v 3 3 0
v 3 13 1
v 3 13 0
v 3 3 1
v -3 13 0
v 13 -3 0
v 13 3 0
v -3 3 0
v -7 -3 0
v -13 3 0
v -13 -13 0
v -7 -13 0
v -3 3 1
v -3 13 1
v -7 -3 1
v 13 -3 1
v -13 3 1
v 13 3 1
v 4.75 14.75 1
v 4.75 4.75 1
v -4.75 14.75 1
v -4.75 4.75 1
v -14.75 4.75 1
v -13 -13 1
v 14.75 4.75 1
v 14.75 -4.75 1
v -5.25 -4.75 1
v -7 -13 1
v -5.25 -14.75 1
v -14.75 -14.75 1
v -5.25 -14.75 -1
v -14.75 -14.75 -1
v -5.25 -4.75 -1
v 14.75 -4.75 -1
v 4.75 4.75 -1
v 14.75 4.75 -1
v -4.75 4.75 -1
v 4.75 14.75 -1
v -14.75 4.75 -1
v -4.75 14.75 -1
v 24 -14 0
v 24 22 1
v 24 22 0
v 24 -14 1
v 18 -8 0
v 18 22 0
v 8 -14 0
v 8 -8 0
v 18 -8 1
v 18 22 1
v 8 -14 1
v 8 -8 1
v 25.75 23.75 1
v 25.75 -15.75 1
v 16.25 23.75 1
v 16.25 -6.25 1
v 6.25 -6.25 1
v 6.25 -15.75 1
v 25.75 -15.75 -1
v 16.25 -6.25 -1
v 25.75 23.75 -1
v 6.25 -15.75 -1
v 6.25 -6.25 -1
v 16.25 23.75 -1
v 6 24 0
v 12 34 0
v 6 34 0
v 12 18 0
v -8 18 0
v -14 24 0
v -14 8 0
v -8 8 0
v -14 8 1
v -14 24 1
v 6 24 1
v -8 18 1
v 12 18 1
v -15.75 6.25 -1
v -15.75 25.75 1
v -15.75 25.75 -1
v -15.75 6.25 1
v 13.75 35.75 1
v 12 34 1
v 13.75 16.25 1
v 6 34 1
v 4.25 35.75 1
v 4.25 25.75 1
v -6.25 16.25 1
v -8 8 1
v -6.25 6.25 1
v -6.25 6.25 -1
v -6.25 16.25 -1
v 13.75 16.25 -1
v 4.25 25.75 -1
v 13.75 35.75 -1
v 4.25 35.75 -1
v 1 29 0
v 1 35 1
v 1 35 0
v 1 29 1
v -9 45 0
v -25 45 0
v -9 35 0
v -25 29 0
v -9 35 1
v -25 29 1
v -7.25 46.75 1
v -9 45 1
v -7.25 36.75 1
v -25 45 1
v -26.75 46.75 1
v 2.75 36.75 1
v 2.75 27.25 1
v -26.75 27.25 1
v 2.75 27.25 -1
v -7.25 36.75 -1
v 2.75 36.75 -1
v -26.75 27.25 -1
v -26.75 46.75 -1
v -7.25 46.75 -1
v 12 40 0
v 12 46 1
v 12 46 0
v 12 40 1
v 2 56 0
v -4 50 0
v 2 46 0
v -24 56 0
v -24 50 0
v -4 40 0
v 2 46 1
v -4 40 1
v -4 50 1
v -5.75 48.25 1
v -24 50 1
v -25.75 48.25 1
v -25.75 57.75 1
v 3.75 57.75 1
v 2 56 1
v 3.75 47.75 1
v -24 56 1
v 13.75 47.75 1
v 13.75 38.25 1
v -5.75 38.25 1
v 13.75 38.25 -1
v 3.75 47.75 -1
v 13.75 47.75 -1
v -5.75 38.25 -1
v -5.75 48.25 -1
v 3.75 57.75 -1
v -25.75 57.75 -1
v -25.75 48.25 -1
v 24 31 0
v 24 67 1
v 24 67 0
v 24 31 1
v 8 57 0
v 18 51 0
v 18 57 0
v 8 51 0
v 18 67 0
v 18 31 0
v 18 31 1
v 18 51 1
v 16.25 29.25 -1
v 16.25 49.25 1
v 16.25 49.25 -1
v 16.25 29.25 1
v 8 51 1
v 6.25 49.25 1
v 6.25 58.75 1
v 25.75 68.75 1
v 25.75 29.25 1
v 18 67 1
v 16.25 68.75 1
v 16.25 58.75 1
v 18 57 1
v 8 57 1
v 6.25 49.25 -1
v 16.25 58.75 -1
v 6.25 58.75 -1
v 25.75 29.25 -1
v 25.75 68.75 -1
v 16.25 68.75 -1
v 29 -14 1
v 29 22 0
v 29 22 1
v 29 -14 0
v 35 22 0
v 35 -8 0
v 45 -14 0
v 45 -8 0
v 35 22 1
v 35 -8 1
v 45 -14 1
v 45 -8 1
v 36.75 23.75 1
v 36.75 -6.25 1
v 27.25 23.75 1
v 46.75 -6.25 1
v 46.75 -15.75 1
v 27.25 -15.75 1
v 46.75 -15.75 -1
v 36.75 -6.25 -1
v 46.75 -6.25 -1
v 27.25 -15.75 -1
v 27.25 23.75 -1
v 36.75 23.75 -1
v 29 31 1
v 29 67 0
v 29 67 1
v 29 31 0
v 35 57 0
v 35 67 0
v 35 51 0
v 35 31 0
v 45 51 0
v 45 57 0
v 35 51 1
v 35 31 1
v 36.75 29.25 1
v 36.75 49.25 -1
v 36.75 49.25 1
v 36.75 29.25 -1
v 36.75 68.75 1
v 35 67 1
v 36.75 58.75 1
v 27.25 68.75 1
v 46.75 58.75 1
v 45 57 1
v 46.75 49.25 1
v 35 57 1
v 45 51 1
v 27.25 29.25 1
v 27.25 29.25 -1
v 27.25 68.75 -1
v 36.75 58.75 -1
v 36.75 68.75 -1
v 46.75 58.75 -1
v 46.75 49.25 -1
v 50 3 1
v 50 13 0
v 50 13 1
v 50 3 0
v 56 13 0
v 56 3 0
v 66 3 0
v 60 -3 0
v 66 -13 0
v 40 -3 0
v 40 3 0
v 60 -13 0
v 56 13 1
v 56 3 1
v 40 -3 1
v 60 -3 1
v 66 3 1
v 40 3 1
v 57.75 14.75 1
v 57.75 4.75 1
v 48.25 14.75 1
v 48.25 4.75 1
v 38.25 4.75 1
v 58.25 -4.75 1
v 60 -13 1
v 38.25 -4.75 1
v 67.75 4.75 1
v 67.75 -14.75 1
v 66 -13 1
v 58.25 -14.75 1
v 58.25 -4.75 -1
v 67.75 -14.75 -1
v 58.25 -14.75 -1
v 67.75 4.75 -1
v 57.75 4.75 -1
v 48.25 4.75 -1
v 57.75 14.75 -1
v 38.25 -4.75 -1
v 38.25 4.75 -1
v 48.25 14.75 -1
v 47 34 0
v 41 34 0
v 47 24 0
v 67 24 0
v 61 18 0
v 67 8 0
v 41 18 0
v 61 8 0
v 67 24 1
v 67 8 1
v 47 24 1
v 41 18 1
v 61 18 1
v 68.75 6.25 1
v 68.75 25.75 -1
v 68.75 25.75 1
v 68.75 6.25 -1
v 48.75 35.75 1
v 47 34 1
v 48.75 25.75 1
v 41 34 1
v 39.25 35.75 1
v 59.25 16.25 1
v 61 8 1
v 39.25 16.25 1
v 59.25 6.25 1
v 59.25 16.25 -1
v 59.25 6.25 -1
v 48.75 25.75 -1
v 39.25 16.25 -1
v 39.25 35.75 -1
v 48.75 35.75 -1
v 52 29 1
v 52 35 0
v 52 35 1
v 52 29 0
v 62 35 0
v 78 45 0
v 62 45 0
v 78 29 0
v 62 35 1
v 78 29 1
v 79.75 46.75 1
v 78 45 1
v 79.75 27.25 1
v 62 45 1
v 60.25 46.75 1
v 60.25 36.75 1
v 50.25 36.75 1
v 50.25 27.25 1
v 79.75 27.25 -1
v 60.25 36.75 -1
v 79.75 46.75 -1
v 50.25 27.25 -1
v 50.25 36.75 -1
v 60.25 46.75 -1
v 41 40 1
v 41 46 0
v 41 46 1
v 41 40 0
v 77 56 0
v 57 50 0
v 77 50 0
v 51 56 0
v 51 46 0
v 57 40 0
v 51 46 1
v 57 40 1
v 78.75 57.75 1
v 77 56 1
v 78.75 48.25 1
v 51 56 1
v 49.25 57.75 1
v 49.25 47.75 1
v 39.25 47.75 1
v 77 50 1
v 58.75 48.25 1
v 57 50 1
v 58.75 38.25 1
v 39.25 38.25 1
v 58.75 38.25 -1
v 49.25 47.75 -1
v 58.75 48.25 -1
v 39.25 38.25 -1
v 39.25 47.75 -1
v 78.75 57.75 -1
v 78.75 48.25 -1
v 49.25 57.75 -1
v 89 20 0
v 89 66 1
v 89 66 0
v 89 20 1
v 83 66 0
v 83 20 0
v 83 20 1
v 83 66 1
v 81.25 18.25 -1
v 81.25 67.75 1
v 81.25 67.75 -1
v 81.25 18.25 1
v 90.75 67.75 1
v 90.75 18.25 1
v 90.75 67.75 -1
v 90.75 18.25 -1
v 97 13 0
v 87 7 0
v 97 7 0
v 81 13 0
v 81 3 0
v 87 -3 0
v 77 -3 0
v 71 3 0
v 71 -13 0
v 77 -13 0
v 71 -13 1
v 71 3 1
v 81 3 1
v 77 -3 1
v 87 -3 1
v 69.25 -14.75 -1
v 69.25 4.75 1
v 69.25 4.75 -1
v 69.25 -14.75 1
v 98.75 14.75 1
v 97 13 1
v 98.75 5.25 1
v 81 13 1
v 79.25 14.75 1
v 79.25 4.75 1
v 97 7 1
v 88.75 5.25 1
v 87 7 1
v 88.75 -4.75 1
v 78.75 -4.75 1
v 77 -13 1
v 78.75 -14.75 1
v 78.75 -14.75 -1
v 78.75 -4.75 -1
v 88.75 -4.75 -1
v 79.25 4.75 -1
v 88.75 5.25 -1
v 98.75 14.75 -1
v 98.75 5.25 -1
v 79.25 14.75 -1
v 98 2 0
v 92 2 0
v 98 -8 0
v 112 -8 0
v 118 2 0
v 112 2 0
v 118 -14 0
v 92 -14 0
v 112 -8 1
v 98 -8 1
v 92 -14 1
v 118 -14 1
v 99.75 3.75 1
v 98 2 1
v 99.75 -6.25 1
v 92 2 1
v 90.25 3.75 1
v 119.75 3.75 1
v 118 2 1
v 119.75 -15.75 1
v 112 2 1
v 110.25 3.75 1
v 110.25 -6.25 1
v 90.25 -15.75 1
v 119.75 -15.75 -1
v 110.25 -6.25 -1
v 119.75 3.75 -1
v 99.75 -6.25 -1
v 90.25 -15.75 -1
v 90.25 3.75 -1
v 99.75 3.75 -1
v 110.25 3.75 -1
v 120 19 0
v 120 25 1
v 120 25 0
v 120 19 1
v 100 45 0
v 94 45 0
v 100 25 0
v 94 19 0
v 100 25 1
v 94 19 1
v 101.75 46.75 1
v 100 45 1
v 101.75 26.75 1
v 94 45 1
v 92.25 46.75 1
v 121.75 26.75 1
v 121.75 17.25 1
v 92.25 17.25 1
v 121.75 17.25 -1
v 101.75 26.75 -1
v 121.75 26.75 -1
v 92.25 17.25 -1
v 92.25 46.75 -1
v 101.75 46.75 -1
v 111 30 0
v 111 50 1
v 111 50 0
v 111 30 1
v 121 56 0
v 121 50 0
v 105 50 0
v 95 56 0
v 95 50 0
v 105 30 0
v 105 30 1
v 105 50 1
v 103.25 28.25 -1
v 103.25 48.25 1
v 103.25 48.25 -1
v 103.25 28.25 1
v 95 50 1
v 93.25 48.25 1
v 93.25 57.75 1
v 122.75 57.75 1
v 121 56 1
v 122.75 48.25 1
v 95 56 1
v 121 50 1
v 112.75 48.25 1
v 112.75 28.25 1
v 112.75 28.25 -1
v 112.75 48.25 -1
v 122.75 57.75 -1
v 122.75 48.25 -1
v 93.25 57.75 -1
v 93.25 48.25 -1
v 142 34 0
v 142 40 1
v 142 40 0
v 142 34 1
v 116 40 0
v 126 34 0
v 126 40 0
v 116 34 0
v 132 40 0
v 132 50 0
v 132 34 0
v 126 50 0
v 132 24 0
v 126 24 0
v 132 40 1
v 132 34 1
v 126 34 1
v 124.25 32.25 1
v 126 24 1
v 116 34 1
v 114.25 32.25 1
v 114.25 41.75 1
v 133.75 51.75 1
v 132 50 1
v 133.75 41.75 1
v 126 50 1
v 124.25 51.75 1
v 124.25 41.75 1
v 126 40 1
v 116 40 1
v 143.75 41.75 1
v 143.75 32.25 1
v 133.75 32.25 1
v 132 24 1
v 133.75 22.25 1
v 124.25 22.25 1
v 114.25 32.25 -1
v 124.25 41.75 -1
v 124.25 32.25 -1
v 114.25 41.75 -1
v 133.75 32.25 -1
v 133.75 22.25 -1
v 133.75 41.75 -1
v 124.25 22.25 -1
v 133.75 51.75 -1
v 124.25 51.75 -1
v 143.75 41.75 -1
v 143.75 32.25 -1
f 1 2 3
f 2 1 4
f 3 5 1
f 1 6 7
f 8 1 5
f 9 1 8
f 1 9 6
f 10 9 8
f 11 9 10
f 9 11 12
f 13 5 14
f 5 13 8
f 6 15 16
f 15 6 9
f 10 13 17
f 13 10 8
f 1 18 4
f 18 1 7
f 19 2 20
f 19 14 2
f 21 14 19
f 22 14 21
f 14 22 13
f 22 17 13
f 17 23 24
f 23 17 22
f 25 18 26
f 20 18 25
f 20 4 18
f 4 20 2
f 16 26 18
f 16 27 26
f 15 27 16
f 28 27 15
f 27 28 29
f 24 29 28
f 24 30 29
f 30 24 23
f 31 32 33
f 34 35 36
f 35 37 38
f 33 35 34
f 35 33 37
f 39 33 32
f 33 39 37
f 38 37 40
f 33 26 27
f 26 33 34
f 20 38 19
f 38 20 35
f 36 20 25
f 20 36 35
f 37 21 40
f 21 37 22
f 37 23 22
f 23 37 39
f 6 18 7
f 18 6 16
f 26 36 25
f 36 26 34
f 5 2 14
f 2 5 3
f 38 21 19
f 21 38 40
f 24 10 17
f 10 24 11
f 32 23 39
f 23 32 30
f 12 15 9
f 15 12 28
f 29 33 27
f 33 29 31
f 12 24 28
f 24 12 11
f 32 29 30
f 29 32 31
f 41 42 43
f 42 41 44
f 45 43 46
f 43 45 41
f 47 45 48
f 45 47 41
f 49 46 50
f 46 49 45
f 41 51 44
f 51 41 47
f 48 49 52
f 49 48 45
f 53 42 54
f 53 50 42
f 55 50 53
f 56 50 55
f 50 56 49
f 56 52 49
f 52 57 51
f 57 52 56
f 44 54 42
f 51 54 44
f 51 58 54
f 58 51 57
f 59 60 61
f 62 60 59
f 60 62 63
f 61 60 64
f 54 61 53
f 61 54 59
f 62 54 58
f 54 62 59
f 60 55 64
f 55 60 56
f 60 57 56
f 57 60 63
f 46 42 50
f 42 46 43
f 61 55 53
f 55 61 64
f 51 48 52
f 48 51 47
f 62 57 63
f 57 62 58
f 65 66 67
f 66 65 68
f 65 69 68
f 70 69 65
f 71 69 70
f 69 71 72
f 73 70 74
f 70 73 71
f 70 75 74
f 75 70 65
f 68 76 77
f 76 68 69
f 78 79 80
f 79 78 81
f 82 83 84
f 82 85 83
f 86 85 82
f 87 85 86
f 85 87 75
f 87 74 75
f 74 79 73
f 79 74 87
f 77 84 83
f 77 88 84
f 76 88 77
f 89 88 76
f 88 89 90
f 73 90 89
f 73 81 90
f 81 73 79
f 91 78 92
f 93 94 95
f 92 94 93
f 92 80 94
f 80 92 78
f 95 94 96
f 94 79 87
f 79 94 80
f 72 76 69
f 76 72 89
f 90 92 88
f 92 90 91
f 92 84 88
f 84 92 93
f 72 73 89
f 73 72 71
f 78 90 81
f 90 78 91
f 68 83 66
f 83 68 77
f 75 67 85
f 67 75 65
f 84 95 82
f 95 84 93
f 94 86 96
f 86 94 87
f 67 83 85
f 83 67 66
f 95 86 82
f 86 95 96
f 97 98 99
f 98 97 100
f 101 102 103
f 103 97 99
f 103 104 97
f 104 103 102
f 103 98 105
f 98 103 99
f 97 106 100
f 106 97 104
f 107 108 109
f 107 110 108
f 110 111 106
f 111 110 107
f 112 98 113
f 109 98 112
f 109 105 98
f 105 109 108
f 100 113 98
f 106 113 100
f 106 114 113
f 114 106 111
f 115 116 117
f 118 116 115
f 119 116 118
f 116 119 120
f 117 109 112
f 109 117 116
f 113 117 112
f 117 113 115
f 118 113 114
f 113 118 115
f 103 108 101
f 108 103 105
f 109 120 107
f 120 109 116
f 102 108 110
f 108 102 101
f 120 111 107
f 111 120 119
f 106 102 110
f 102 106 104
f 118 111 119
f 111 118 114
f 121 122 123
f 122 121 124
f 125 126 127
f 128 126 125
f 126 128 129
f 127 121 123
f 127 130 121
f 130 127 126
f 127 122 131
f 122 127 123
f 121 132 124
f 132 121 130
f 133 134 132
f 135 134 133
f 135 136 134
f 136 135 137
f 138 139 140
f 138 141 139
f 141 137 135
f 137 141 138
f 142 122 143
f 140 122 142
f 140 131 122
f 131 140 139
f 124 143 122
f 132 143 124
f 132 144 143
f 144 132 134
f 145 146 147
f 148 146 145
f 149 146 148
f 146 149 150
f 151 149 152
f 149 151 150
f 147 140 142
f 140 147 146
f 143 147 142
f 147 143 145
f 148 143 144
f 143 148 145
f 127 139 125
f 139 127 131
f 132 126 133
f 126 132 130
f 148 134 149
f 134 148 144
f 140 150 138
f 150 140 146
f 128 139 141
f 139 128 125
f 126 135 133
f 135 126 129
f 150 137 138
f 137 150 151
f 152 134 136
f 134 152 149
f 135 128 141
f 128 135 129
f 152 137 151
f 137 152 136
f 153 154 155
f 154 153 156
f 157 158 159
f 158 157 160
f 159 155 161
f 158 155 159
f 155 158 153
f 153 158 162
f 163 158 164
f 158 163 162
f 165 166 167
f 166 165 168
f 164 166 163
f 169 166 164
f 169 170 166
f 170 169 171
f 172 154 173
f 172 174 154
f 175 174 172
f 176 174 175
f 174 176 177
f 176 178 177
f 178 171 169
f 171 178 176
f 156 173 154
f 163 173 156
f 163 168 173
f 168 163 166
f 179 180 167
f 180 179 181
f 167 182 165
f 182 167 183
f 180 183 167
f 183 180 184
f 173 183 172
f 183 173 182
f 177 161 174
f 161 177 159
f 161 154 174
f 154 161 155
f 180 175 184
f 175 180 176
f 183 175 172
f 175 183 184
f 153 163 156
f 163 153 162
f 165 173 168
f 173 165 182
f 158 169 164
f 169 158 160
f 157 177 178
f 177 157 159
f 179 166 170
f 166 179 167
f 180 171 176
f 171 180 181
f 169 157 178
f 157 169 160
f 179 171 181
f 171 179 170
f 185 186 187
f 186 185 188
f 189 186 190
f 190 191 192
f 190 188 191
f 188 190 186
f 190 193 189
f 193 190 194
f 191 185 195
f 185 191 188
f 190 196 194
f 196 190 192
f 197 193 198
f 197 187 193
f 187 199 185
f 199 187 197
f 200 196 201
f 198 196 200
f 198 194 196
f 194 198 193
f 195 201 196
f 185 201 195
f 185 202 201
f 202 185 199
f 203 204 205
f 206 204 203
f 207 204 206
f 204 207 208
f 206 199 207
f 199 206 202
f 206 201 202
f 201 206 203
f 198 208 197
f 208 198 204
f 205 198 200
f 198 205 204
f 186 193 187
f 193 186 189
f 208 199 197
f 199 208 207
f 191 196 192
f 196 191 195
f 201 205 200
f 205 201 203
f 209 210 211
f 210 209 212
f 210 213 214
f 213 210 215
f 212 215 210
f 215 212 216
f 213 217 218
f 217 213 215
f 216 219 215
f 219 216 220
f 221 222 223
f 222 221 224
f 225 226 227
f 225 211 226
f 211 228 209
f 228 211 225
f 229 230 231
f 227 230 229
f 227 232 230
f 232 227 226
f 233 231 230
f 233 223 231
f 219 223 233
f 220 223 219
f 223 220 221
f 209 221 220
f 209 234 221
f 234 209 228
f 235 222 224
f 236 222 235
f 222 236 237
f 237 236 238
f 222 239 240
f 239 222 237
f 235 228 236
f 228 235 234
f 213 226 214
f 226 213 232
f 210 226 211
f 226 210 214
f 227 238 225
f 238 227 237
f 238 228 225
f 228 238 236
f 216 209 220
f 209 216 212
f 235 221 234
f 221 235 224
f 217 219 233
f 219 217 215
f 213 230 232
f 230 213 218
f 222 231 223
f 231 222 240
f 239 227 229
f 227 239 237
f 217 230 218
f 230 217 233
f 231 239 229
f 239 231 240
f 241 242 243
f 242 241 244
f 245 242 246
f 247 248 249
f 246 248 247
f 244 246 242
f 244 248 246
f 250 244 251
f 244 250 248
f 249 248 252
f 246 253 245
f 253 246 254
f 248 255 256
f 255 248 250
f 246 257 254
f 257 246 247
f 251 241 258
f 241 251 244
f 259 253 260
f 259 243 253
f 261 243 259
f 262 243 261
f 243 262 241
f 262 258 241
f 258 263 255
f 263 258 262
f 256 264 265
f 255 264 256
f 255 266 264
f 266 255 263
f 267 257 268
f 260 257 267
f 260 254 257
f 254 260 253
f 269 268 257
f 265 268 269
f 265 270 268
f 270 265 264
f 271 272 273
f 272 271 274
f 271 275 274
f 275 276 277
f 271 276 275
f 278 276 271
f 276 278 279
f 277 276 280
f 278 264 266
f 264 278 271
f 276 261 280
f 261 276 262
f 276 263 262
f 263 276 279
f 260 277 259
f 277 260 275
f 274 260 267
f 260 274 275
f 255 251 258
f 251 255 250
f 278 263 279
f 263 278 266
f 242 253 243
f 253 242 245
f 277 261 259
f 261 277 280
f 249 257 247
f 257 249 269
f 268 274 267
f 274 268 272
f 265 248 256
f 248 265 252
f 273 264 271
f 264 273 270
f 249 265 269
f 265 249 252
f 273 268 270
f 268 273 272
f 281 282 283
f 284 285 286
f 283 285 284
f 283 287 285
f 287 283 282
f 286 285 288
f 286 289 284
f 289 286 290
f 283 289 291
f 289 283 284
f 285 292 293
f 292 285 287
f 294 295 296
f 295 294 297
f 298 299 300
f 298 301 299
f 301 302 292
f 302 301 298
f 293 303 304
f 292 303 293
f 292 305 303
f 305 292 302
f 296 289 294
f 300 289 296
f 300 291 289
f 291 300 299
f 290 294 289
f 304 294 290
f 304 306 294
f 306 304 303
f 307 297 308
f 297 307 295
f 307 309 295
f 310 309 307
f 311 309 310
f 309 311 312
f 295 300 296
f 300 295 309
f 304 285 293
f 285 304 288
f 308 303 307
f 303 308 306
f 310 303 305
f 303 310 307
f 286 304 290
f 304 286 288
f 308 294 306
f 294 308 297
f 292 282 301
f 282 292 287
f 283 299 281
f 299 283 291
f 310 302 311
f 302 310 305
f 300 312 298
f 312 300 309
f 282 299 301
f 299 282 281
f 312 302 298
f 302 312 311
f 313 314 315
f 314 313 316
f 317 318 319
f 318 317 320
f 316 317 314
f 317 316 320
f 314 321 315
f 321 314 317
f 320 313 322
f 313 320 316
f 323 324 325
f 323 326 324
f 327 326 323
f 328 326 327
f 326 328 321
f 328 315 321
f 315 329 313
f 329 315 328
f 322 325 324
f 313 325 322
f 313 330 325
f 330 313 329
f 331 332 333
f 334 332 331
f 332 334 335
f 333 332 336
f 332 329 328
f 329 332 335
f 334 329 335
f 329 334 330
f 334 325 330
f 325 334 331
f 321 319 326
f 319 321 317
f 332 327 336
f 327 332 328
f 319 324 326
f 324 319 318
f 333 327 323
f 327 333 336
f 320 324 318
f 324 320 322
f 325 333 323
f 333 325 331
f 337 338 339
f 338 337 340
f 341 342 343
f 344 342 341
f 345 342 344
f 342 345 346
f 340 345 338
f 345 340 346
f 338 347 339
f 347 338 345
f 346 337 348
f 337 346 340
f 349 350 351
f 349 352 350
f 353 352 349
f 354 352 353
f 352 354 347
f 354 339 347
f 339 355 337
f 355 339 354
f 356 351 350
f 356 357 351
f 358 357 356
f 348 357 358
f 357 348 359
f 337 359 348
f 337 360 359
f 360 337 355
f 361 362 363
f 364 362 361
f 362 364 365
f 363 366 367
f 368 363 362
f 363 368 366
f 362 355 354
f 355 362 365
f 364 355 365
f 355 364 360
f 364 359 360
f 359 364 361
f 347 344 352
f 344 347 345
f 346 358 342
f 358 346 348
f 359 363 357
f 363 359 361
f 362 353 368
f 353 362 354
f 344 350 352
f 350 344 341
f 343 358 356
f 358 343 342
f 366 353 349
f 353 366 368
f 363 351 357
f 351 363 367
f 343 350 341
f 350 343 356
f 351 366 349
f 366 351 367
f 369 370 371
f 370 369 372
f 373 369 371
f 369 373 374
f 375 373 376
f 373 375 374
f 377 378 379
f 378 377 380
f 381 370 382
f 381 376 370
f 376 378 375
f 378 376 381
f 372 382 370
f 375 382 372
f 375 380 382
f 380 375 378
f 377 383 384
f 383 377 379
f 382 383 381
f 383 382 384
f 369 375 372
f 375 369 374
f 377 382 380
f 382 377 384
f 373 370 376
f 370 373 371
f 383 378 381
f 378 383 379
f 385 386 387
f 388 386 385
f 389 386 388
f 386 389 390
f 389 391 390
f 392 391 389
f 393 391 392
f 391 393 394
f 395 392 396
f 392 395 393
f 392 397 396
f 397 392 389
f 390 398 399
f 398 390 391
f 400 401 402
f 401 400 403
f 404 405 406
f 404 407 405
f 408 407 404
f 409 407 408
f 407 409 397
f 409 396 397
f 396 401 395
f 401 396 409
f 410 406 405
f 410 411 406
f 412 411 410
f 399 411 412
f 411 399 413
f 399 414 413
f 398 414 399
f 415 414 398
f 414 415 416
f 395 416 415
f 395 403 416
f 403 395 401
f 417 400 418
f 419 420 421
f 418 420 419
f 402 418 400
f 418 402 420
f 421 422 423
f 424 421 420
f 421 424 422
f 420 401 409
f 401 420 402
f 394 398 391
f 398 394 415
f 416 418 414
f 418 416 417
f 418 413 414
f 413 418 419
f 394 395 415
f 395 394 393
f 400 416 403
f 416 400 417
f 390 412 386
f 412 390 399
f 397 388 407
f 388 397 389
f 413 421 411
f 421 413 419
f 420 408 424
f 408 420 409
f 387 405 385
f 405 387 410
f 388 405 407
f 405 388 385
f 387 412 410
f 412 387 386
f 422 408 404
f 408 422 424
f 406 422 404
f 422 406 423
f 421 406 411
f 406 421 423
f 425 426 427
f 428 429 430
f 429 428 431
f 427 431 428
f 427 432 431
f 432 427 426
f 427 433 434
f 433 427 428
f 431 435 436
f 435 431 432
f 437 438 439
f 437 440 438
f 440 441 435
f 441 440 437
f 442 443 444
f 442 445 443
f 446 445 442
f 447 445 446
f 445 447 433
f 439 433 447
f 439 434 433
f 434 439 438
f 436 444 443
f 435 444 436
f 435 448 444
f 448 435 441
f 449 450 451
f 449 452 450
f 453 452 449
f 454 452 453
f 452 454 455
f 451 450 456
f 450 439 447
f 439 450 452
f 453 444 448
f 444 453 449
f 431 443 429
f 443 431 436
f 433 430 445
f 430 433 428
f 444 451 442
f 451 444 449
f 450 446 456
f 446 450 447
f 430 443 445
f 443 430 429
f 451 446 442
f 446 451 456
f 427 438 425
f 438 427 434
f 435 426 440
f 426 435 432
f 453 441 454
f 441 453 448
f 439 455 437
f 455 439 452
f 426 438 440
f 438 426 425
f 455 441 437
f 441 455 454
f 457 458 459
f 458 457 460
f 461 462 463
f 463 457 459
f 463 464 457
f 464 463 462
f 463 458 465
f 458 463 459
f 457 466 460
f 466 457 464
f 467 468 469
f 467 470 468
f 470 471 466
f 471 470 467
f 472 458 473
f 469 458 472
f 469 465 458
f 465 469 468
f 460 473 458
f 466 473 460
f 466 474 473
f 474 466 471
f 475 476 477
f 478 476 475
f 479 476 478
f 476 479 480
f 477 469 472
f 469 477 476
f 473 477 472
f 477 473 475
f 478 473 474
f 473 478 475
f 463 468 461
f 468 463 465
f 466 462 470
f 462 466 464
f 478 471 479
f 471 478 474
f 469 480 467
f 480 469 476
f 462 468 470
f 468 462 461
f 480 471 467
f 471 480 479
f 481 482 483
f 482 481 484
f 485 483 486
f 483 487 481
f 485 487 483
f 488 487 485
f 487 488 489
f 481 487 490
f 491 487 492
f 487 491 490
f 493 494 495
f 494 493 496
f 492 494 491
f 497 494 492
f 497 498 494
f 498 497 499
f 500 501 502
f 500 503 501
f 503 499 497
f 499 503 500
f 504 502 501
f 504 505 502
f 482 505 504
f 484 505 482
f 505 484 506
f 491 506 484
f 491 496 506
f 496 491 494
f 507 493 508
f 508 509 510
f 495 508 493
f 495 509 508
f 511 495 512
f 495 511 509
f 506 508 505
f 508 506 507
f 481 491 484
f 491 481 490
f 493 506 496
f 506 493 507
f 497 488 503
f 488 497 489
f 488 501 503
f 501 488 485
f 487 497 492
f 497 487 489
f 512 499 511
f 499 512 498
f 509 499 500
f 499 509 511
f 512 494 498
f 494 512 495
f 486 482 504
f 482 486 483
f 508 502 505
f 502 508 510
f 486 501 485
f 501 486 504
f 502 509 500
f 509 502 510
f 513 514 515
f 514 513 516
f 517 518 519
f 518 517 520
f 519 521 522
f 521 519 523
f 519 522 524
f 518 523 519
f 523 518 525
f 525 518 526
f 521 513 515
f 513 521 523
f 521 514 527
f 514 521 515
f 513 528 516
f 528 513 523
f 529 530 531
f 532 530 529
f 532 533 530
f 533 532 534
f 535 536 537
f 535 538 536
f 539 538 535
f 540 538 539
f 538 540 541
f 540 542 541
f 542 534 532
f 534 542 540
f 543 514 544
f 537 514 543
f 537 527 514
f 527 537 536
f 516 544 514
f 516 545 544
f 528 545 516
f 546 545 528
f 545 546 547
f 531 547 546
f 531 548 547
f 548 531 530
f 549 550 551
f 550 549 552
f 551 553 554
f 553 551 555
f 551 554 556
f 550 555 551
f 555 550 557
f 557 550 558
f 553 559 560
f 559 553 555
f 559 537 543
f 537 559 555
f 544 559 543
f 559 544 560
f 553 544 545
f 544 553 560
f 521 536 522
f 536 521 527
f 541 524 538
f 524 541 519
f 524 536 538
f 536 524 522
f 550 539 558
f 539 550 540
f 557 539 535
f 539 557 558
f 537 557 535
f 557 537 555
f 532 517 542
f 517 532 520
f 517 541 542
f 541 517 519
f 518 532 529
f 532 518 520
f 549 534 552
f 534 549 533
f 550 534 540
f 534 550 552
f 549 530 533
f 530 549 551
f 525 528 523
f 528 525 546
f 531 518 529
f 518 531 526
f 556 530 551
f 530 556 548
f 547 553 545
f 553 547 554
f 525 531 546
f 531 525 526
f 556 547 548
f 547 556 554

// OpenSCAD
// Title: Pentoninoes
// Author: http://www.thingiverse.com/Jinja
// Date: 17-12-2016

/////////// START OF PARAMETERS /////////////////

// The width of the squares in mm
pixelSide = 10;

// The height of the pieces in mm
pixelHeight = 2; 

// The depth of the hole in each piece in mm
holeDepth = 1; 

// The width of the border in mm
pixelBorder = 2; 

// How many mm to shrink the border so there is space between the pieces
shrinkage = 0.25; 

piece1 = 1; // [0:Hide,1:Show]
piece2 = 1; // [0:Hide,1:Show]
piece3 = 1; // [0:Hide,1:Show]
piece4 = 1; // [0:Hide,1:Show]
piece5 = 1; // [0:Hide,1:Show]
piece6 = 1; // [0:Hide,1:Show]
piece7 = 1; // [0:Hide,1:Show]
piece8 = 1; // [0:Hide,1:Show]
piece9 = 1; // [0:Hide,1:Show]
piece10 = 1; // [0:Hide,1:Show]
piece11 = 1; // [0:Hide,1:Show]
piece12 = 1; // [0:Hide,1:Show]
piece13 = 1; // [0:Hide,1:Show]
piece14 = 1; // [0:Hide,1:Show]
piece15 = 1; // [0:Hide,1:Show]
piece16 = 1; // [0:Hide,1:Show]
piece17 = 1; // [0:Hide,1:Show]
piece18 = 1; // [0:Hide,1:Show]

/////////// END OF PARAMETERS /////////////////


$fs=0.3*1.0;
$fa=6.0*1.0; //smooth
//$fa=20; //rough

if(piece1)
{
    Piece1();
}
if(piece2)
{
    translate([pixelSide*2.1,-pixelSide*1.1,0])
    Piece2();
}
if(piece3)
{
    translate([-0.1*pixelSide,pixelSide*2.1,0])
    Piece3();
}
if(piece4)
{
    translate([-1.2*pixelSide,pixelSide*3.2,0])
    Piece4();
}
if(piece5)
{
    translate([-0.1*pixelSide,pixelSide*4.3,0])
    Piece5();
}
if(piece6)
{
    translate([2.1*pixelSide,pixelSide*3.4,0])
    Piece6();
}
if(piece7)
{
    translate([3.2*pixelSide,pixelSide*-1.1,0])
    Piece7();
}
if(piece8)
{
    translate([3.2*pixelSide,pixelSide*3.4,0])
    Piece8();
}
if(piece9)
{
    translate([5.3*pixelSide,pixelSide*0,0])
    Piece9();
}
if(piece10)
{
    translate([5.4*pixelSide,pixelSide*2.1,0])
    Piece10();
}
if(piece11)
{
    translate([6.5*pixelSide,pixelSide*3.2,0])
    Piece11();
}
if(piece12)
{
    translate([5.4*pixelSide,pixelSide*4.3,0])
    Piece12();
}
if(piece13)
{
    translate([8.6*pixelSide,pixelSide*2.3,0])
    Piece13();
}
if(piece14)
{
    translate([8.4*pixelSide,pixelSide*-0,0])
    Piece14();
}
if(piece15)
{
    translate([10.5*pixelSide,pixelSide*-1.1,0])
    Piece15();
}
if(piece16)
{
    translate([10.7*pixelSide,pixelSide*2.2,0])
    Piece16();
}
if(piece17)
{
    translate([10.8*pixelSide,pixelSide*3.3,0])
    Piece17();
}
if(piece18)
{
    translate([12.9*pixelSide,pixelSide*3.7,0])
    Piece18();
}



module Piece1()
{
    Pixel(0,0, 0,1,0,1,0,1,1,1);
    Pixel(1,0, 0,1,1,1,1,1,1,1);
    Pixel(0,1, 1,1,1,1,1,1,0,1);
    Pixel(-1,0, 1,1,1,1,0,1,0,1);
    Pixel(-1,-1, 1,1,0,1,1,1,1,1);
}

module Piece2()
{
    Pixel(0,0, 0,1,0,1,1,1,1,1);
    Pixel(0,1, 1,1,0,1,1,1,0,1);
    Pixel(0,2, 1,1,0,1,1,1,0,1);
    Pixel(0,3, 1,1,1,1,1,1,0,1);
    Pixel(-1,0, 1,1,1,1,0,1,1,1);
}

module Piece3()
{
    Pixel(0,0, 0,1,1,1,0,1,1,1);
    Pixel(1,0, 0,1,0,1,1,1,1,1);
    Pixel(1,1, 1,1,1,1,1,1,0,1);
    Pixel(-1,0, 1,1,1,1,0,1,0,1);
    Pixel(-1,-1, 1,1,0,1,1,1,1,1);
}

module Piece4()
{
    Pixel(0,0, 0,0,0,1,0,1,1,1);
    Pixel(1,0, 0,1,1,1,1,1,1,1);
    Pixel(0,1, 0,1,1,1,1,1,0,0);
    Pixel(-1,0, 1,1,0,0,0,1,1,1);
    Pixel(-1,1, 1,1,1,1,0,0,0,1);
}

module Piece5()
{
    Pixel(0,0, 1,1,0,1,0,1,1,1);
    Pixel(1,0, 0,1,1,1,1,1,1,1);
    Pixel(0,1, 0,1,1,1,1,1,0,1);
    Pixel(-2,1, 1,1,1,1,0,1,1,1);
    Pixel(-1,1, 0,1,1,1,0,1,1,1);
}

module Piece6()
{
    Pixel(0,0, 1,1,0,1,1,1,1,1);
    Pixel(0,1, 1,1,0,1,1,1,0,1);
    Pixel(0,2, 0,1,0,1,1,1,0,1);
    Pixel(0,3, 1,1,1,1,1,1,0,1);
    Pixel(-1,2, 1,1,1,1,0,1,1,1);
}

module Piece7()
{
    scale([-1,1,1])
    Piece2();
}

module Piece8()
{
    scale([-1,1,1])
    Piece6();
}

module Piece9()
{
    scale([-1,1,1])
    Piece1();
}

module Piece10()
{
    scale([-1,1,1])
    Piece3();
}

module Piece11()
{
    scale([-1,1,1])
    Piece4();
}

module Piece12()
{
    scale([-1,1,1])
    Piece5();
}

module Piece13()
{
    Pixel(0,0, 1,1,0,1,1,1,1,1);
    Pixel(0,1, 1,1,0,1,1,1,0,1);
    Pixel(0,2, 1,1,0,1,1,1,0,1);
    Pixel(0,3, 1,1,0,1,1,1,0,1);
    Pixel(0,4, 1,1,1,1,1,1,0,1);
}

module Piece14()
{
    Pixel(0,0, 0,1,0,1,1,1,1,1);
    Pixel(1,1, 0,1,1,1,1,1,1,1);
    Pixel(0,1, 1,1,1,1,0,1,0,1);
    Pixel(-1,0, 1,1,1,1,0,1,0,1);
    Pixel(-1,-1, 1,1,0,1,1,1,1,1);
}

module Piece15()
{
    Pixel(0,0, 0,1,1,1,0,1,1,1);
    Pixel(1,0, 0,1,0,1,1,1,1,1);
    Pixel(1,1, 1,1,1,1,1,1,0,1);
    Pixel(-1,0, 1,1,0,1,0,1,1,1);
    Pixel(-1,1, 1,1,1,1,1,1,0,1);
}

module Piece16()
{
    Pixel(0,0, 0,1,1,1,0,1,1,1);
    Pixel(1,0, 0,1,1,1,1,1,1,1);
    Pixel(-1,2, 1,1,1,1,1,1,0,1);
    Pixel(-1,0, 1,1,0,1,0,1,1,1);
    Pixel(-1,1, 1,1,0,1,1,1,0,1);
}

module Piece17()
{
    Pixel(0,0, 1,1,0,1,1,1,1,1);
    Pixel(0,1, 1,1,0,1,1,1,0,1);
    Pixel(0,2, 0,1,1,1,0,1,0,1);
    Pixel(1,2, 0,1,1,1,1,1,1,1);
    Pixel(-1,2, 1,1,1,1,0,1,1,1);
}

module Piece18()
{
    Pixel(0,0, 0,1,0,1,0,1,0,1);
    Pixel(1,0, 0,1,1,1,1,1,1,1);
    Pixel(0,1, 1,1,1,1,1,1,0,1);
    Pixel(-1,0, 1,1,1,1,0,1,1,1);
    Pixel(0,-1, 1,1,0,1,1,1,1,1);
}


module Pixel( x, y, s1, s2, s3, s4, s5, s6, s7, s8 )
{
    translate([x*pixelSide, y*pixelSide,0])
    difference()
    {
        cube([pixelSide,pixelSide,pixelHeight],true);
        //translate([0,0,0.5*pixelHeight])
        union()
        {
            translate([0,0,pixelHeight-holeDepth])
            cube([pixelSide-2*pixelBorder,pixelSide-2*pixelBorder,pixelHeight],true);
            if(!s1)
            {
                translate([-pixelBorder,0,pixelHeight-holeDepth])
                cube([pixelSide-2*pixelBorder,pixelSide-2*pixelBorder,pixelHeight],true);
            }
            else
            {
                translate([-(pixelSide-shrinkage),0,0])
                cube([pixelSide,pixelSide,pixelHeight],true);
            }

            if(!s2)
            {
                translate([-(pixelSide-pixelBorder),(pixelSide-pixelBorder),pixelHeight-holeDepth])
                cube([pixelSide,pixelSide,pixelHeight],true);
            }

            if(!s3)
            {
                translate([0,pixelBorder,pixelHeight-holeDepth])
                cube([pixelSide-2*pixelBorder,pixelSide-2*pixelBorder,pixelHeight],true);
            }
            else
            {
                translate([0,(pixelSide-shrinkage),0])
                cube([pixelSide,pixelSide,pixelHeight],true);
            }


            if(!s4)
            {
                translate([(pixelSide-pixelBorder),(pixelSide-pixelBorder),pixelHeight-holeDepth])
                cube([pixelSide,pixelSide,pixelHeight],true);
            }

            if(!s5)
            {
                translate([pixelBorder,0,pixelHeight-holeDepth])
                cube([pixelSide-2*pixelBorder,pixelSide-2*pixelBorder,pixelHeight],true);
            }
            else
            {
                translate([(pixelSide-shrinkage),0,0])
                cube([pixelSide,pixelSide,pixelHeight],true);
            }


            if(!s6)
            {
                translate([(pixelSide-pixelBorder),-(pixelSide-pixelBorder),pixelHeight-holeDepth])
                cube([pixelSide,pixelSide,pixelHeight],true);
            }

            if(!s7)
            {
                translate([0,-pixelBorder,pixelHeight-holeDepth])
                cube([pixelSide-2*pixelBorder,pixelSide-2*pixelBorder,pixelHeight],true);
            }
            else
            {
                translate([0,-(pixelSide-shrinkage),0])
                cube([pixelSide,pixelSide,pixelHeight],true);
            }


            if(!s8)
            {
                translate([-(pixelSide-pixelBorder),-(pixelSide-pixelBorder),pixelHeight-holeDepth])
                cube([pixelSide,pixelSide,pixelHeight],true);
            }
            
            if(s8!=0)
            {
                translate([-(pixelSide-shrinkage)*0.5,-(pixelSide-shrinkage)*0.5,0])
                cube([shrinkage,shrinkage,pixelHeight],true);
            }

            if(s6!=0)
            {
                translate([(pixelSide-shrinkage)*0.5,-(pixelSide-shrinkage)*0.5,0])
                cube([shrinkage,shrinkage,pixelHeight],true);
            }

            if(s4!=0)
            {
                translate([(pixelSide-shrinkage)*0.5,(pixelSide-shrinkage)*0.5,0])
                cube([shrinkage,shrinkage,pixelHeight],true);
            }

            if(s2!=0)
            {
                translate([-(pixelSide-shrinkage)*0.5,(pixelSide-shrinkage)*0.5,0])
                cube([shrinkage,shrinkage,pixelHeight],true);
            }

        }
    }
}
